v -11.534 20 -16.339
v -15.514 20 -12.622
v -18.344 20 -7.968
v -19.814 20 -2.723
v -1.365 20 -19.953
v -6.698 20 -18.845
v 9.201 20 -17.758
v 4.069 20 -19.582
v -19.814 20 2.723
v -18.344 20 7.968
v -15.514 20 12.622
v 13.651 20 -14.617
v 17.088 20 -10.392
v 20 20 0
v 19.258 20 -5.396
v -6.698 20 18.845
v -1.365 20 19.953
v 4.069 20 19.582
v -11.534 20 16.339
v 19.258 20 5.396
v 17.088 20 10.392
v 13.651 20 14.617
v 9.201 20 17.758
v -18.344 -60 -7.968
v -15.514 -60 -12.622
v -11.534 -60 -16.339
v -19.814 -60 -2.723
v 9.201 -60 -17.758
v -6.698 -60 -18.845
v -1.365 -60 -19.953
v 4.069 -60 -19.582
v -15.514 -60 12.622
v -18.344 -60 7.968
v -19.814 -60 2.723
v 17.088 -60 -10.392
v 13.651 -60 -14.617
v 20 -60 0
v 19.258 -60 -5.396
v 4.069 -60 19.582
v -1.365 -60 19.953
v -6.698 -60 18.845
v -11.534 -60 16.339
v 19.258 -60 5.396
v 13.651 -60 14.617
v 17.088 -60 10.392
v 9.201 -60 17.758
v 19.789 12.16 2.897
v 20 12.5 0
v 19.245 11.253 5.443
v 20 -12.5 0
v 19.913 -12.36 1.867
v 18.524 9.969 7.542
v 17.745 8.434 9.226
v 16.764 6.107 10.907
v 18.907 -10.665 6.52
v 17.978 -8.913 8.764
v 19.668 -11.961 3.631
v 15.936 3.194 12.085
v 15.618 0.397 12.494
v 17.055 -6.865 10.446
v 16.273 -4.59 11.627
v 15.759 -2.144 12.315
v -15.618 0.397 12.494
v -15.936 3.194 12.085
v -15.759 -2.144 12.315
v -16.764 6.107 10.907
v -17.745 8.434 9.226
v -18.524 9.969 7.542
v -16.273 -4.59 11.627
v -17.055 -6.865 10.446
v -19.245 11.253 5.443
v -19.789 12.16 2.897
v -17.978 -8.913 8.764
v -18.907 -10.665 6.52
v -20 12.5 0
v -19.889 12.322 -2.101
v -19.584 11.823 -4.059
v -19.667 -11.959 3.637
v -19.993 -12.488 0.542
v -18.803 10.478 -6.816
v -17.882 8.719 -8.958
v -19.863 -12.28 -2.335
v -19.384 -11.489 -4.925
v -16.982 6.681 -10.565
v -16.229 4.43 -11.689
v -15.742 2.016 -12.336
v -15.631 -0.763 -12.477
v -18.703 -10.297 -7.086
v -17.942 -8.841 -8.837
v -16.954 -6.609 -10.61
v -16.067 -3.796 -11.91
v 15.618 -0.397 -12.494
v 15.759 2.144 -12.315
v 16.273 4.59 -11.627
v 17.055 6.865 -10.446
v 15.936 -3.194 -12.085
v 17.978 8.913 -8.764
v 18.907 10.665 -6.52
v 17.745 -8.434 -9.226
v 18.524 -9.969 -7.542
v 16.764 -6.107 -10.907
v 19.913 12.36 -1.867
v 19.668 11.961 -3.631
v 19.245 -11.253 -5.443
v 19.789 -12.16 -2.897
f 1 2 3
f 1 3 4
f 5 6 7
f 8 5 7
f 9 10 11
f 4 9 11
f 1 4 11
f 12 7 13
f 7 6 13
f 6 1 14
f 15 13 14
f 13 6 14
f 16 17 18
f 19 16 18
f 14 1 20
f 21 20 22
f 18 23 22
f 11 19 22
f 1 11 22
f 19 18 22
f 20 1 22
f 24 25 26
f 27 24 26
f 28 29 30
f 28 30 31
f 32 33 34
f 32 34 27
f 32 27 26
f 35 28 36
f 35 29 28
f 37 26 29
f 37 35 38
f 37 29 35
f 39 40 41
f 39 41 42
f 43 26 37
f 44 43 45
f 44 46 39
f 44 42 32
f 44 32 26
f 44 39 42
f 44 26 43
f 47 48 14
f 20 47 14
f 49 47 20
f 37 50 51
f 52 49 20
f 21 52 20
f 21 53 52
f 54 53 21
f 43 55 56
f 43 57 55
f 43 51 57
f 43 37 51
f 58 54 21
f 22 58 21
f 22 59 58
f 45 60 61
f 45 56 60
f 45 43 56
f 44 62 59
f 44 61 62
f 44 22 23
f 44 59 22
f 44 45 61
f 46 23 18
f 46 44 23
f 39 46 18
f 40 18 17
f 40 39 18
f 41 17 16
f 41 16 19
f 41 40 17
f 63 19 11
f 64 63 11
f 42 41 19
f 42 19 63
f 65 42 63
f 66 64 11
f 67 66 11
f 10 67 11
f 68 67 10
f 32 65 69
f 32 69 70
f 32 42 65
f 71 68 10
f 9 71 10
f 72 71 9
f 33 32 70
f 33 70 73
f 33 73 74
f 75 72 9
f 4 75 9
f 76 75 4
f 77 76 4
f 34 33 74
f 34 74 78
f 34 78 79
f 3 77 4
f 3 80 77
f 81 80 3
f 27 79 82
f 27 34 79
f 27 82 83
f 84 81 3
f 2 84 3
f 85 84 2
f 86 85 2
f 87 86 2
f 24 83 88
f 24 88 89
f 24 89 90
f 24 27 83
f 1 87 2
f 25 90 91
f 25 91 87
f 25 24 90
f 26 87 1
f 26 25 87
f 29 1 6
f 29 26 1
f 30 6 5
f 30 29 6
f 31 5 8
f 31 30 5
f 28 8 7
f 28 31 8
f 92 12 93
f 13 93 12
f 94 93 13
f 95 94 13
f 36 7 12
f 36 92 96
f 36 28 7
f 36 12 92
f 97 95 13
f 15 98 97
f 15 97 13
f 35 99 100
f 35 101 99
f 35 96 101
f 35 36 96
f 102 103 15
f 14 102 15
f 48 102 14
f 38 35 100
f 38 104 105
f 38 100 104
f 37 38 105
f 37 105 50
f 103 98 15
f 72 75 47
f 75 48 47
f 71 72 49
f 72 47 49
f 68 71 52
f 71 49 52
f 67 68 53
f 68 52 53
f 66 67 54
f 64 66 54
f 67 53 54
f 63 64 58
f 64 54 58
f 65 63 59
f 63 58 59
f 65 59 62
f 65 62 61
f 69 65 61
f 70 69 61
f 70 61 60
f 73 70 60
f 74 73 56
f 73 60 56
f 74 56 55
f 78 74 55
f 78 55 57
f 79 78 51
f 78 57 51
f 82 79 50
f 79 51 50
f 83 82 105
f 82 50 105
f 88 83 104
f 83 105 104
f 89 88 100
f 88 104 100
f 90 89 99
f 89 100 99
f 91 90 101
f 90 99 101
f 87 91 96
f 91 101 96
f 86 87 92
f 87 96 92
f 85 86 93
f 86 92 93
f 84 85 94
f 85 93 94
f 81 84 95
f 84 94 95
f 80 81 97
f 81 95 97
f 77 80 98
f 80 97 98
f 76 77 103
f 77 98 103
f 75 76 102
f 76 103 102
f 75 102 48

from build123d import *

# Parameters (mm, degrees)
F0_R     = 20
F1_DEPTH = 60
F2_R     = 12.5
F3_DEPTH = 20
F4_DEPTH = 20
F5_DEPTH = 20


with BuildPart() as f1:
    # F0 (on Front) → F1 (new body, symmetric)
    with BuildSketch(Plane.XZ):
        Circle(F0_R)
    extrude(amount=F1_DEPTH, both=True)

    # F2 (on Right) → F3 (cut, symmetric)
    with BuildSketch(Plane.YZ):
        Circle(F2_R)
    extrude(amount=F3_DEPTH, both=True, mode=Mode.SUBTRACT)

    # F4 (cut, symmetric): a face of the model
    f4_faces = [f1.faces().sort_by_distance(p)[0] for p in [
        (0, 60, 0),
    ]]
    extrude(f4_faces, amount=F4_DEPTH, both=True, mode=Mode.SUBTRACT)

    # F5 (cut, symmetric): a face of the model
    f5_faces = [f1.faces().sort_by_distance(p)[0] for p in [
        (0, 40, 0),
    ]]
    extrude(f5_faces, amount=F5_DEPTH, both=True, mode=Mode.SUBTRACT)


solid = f1.part
